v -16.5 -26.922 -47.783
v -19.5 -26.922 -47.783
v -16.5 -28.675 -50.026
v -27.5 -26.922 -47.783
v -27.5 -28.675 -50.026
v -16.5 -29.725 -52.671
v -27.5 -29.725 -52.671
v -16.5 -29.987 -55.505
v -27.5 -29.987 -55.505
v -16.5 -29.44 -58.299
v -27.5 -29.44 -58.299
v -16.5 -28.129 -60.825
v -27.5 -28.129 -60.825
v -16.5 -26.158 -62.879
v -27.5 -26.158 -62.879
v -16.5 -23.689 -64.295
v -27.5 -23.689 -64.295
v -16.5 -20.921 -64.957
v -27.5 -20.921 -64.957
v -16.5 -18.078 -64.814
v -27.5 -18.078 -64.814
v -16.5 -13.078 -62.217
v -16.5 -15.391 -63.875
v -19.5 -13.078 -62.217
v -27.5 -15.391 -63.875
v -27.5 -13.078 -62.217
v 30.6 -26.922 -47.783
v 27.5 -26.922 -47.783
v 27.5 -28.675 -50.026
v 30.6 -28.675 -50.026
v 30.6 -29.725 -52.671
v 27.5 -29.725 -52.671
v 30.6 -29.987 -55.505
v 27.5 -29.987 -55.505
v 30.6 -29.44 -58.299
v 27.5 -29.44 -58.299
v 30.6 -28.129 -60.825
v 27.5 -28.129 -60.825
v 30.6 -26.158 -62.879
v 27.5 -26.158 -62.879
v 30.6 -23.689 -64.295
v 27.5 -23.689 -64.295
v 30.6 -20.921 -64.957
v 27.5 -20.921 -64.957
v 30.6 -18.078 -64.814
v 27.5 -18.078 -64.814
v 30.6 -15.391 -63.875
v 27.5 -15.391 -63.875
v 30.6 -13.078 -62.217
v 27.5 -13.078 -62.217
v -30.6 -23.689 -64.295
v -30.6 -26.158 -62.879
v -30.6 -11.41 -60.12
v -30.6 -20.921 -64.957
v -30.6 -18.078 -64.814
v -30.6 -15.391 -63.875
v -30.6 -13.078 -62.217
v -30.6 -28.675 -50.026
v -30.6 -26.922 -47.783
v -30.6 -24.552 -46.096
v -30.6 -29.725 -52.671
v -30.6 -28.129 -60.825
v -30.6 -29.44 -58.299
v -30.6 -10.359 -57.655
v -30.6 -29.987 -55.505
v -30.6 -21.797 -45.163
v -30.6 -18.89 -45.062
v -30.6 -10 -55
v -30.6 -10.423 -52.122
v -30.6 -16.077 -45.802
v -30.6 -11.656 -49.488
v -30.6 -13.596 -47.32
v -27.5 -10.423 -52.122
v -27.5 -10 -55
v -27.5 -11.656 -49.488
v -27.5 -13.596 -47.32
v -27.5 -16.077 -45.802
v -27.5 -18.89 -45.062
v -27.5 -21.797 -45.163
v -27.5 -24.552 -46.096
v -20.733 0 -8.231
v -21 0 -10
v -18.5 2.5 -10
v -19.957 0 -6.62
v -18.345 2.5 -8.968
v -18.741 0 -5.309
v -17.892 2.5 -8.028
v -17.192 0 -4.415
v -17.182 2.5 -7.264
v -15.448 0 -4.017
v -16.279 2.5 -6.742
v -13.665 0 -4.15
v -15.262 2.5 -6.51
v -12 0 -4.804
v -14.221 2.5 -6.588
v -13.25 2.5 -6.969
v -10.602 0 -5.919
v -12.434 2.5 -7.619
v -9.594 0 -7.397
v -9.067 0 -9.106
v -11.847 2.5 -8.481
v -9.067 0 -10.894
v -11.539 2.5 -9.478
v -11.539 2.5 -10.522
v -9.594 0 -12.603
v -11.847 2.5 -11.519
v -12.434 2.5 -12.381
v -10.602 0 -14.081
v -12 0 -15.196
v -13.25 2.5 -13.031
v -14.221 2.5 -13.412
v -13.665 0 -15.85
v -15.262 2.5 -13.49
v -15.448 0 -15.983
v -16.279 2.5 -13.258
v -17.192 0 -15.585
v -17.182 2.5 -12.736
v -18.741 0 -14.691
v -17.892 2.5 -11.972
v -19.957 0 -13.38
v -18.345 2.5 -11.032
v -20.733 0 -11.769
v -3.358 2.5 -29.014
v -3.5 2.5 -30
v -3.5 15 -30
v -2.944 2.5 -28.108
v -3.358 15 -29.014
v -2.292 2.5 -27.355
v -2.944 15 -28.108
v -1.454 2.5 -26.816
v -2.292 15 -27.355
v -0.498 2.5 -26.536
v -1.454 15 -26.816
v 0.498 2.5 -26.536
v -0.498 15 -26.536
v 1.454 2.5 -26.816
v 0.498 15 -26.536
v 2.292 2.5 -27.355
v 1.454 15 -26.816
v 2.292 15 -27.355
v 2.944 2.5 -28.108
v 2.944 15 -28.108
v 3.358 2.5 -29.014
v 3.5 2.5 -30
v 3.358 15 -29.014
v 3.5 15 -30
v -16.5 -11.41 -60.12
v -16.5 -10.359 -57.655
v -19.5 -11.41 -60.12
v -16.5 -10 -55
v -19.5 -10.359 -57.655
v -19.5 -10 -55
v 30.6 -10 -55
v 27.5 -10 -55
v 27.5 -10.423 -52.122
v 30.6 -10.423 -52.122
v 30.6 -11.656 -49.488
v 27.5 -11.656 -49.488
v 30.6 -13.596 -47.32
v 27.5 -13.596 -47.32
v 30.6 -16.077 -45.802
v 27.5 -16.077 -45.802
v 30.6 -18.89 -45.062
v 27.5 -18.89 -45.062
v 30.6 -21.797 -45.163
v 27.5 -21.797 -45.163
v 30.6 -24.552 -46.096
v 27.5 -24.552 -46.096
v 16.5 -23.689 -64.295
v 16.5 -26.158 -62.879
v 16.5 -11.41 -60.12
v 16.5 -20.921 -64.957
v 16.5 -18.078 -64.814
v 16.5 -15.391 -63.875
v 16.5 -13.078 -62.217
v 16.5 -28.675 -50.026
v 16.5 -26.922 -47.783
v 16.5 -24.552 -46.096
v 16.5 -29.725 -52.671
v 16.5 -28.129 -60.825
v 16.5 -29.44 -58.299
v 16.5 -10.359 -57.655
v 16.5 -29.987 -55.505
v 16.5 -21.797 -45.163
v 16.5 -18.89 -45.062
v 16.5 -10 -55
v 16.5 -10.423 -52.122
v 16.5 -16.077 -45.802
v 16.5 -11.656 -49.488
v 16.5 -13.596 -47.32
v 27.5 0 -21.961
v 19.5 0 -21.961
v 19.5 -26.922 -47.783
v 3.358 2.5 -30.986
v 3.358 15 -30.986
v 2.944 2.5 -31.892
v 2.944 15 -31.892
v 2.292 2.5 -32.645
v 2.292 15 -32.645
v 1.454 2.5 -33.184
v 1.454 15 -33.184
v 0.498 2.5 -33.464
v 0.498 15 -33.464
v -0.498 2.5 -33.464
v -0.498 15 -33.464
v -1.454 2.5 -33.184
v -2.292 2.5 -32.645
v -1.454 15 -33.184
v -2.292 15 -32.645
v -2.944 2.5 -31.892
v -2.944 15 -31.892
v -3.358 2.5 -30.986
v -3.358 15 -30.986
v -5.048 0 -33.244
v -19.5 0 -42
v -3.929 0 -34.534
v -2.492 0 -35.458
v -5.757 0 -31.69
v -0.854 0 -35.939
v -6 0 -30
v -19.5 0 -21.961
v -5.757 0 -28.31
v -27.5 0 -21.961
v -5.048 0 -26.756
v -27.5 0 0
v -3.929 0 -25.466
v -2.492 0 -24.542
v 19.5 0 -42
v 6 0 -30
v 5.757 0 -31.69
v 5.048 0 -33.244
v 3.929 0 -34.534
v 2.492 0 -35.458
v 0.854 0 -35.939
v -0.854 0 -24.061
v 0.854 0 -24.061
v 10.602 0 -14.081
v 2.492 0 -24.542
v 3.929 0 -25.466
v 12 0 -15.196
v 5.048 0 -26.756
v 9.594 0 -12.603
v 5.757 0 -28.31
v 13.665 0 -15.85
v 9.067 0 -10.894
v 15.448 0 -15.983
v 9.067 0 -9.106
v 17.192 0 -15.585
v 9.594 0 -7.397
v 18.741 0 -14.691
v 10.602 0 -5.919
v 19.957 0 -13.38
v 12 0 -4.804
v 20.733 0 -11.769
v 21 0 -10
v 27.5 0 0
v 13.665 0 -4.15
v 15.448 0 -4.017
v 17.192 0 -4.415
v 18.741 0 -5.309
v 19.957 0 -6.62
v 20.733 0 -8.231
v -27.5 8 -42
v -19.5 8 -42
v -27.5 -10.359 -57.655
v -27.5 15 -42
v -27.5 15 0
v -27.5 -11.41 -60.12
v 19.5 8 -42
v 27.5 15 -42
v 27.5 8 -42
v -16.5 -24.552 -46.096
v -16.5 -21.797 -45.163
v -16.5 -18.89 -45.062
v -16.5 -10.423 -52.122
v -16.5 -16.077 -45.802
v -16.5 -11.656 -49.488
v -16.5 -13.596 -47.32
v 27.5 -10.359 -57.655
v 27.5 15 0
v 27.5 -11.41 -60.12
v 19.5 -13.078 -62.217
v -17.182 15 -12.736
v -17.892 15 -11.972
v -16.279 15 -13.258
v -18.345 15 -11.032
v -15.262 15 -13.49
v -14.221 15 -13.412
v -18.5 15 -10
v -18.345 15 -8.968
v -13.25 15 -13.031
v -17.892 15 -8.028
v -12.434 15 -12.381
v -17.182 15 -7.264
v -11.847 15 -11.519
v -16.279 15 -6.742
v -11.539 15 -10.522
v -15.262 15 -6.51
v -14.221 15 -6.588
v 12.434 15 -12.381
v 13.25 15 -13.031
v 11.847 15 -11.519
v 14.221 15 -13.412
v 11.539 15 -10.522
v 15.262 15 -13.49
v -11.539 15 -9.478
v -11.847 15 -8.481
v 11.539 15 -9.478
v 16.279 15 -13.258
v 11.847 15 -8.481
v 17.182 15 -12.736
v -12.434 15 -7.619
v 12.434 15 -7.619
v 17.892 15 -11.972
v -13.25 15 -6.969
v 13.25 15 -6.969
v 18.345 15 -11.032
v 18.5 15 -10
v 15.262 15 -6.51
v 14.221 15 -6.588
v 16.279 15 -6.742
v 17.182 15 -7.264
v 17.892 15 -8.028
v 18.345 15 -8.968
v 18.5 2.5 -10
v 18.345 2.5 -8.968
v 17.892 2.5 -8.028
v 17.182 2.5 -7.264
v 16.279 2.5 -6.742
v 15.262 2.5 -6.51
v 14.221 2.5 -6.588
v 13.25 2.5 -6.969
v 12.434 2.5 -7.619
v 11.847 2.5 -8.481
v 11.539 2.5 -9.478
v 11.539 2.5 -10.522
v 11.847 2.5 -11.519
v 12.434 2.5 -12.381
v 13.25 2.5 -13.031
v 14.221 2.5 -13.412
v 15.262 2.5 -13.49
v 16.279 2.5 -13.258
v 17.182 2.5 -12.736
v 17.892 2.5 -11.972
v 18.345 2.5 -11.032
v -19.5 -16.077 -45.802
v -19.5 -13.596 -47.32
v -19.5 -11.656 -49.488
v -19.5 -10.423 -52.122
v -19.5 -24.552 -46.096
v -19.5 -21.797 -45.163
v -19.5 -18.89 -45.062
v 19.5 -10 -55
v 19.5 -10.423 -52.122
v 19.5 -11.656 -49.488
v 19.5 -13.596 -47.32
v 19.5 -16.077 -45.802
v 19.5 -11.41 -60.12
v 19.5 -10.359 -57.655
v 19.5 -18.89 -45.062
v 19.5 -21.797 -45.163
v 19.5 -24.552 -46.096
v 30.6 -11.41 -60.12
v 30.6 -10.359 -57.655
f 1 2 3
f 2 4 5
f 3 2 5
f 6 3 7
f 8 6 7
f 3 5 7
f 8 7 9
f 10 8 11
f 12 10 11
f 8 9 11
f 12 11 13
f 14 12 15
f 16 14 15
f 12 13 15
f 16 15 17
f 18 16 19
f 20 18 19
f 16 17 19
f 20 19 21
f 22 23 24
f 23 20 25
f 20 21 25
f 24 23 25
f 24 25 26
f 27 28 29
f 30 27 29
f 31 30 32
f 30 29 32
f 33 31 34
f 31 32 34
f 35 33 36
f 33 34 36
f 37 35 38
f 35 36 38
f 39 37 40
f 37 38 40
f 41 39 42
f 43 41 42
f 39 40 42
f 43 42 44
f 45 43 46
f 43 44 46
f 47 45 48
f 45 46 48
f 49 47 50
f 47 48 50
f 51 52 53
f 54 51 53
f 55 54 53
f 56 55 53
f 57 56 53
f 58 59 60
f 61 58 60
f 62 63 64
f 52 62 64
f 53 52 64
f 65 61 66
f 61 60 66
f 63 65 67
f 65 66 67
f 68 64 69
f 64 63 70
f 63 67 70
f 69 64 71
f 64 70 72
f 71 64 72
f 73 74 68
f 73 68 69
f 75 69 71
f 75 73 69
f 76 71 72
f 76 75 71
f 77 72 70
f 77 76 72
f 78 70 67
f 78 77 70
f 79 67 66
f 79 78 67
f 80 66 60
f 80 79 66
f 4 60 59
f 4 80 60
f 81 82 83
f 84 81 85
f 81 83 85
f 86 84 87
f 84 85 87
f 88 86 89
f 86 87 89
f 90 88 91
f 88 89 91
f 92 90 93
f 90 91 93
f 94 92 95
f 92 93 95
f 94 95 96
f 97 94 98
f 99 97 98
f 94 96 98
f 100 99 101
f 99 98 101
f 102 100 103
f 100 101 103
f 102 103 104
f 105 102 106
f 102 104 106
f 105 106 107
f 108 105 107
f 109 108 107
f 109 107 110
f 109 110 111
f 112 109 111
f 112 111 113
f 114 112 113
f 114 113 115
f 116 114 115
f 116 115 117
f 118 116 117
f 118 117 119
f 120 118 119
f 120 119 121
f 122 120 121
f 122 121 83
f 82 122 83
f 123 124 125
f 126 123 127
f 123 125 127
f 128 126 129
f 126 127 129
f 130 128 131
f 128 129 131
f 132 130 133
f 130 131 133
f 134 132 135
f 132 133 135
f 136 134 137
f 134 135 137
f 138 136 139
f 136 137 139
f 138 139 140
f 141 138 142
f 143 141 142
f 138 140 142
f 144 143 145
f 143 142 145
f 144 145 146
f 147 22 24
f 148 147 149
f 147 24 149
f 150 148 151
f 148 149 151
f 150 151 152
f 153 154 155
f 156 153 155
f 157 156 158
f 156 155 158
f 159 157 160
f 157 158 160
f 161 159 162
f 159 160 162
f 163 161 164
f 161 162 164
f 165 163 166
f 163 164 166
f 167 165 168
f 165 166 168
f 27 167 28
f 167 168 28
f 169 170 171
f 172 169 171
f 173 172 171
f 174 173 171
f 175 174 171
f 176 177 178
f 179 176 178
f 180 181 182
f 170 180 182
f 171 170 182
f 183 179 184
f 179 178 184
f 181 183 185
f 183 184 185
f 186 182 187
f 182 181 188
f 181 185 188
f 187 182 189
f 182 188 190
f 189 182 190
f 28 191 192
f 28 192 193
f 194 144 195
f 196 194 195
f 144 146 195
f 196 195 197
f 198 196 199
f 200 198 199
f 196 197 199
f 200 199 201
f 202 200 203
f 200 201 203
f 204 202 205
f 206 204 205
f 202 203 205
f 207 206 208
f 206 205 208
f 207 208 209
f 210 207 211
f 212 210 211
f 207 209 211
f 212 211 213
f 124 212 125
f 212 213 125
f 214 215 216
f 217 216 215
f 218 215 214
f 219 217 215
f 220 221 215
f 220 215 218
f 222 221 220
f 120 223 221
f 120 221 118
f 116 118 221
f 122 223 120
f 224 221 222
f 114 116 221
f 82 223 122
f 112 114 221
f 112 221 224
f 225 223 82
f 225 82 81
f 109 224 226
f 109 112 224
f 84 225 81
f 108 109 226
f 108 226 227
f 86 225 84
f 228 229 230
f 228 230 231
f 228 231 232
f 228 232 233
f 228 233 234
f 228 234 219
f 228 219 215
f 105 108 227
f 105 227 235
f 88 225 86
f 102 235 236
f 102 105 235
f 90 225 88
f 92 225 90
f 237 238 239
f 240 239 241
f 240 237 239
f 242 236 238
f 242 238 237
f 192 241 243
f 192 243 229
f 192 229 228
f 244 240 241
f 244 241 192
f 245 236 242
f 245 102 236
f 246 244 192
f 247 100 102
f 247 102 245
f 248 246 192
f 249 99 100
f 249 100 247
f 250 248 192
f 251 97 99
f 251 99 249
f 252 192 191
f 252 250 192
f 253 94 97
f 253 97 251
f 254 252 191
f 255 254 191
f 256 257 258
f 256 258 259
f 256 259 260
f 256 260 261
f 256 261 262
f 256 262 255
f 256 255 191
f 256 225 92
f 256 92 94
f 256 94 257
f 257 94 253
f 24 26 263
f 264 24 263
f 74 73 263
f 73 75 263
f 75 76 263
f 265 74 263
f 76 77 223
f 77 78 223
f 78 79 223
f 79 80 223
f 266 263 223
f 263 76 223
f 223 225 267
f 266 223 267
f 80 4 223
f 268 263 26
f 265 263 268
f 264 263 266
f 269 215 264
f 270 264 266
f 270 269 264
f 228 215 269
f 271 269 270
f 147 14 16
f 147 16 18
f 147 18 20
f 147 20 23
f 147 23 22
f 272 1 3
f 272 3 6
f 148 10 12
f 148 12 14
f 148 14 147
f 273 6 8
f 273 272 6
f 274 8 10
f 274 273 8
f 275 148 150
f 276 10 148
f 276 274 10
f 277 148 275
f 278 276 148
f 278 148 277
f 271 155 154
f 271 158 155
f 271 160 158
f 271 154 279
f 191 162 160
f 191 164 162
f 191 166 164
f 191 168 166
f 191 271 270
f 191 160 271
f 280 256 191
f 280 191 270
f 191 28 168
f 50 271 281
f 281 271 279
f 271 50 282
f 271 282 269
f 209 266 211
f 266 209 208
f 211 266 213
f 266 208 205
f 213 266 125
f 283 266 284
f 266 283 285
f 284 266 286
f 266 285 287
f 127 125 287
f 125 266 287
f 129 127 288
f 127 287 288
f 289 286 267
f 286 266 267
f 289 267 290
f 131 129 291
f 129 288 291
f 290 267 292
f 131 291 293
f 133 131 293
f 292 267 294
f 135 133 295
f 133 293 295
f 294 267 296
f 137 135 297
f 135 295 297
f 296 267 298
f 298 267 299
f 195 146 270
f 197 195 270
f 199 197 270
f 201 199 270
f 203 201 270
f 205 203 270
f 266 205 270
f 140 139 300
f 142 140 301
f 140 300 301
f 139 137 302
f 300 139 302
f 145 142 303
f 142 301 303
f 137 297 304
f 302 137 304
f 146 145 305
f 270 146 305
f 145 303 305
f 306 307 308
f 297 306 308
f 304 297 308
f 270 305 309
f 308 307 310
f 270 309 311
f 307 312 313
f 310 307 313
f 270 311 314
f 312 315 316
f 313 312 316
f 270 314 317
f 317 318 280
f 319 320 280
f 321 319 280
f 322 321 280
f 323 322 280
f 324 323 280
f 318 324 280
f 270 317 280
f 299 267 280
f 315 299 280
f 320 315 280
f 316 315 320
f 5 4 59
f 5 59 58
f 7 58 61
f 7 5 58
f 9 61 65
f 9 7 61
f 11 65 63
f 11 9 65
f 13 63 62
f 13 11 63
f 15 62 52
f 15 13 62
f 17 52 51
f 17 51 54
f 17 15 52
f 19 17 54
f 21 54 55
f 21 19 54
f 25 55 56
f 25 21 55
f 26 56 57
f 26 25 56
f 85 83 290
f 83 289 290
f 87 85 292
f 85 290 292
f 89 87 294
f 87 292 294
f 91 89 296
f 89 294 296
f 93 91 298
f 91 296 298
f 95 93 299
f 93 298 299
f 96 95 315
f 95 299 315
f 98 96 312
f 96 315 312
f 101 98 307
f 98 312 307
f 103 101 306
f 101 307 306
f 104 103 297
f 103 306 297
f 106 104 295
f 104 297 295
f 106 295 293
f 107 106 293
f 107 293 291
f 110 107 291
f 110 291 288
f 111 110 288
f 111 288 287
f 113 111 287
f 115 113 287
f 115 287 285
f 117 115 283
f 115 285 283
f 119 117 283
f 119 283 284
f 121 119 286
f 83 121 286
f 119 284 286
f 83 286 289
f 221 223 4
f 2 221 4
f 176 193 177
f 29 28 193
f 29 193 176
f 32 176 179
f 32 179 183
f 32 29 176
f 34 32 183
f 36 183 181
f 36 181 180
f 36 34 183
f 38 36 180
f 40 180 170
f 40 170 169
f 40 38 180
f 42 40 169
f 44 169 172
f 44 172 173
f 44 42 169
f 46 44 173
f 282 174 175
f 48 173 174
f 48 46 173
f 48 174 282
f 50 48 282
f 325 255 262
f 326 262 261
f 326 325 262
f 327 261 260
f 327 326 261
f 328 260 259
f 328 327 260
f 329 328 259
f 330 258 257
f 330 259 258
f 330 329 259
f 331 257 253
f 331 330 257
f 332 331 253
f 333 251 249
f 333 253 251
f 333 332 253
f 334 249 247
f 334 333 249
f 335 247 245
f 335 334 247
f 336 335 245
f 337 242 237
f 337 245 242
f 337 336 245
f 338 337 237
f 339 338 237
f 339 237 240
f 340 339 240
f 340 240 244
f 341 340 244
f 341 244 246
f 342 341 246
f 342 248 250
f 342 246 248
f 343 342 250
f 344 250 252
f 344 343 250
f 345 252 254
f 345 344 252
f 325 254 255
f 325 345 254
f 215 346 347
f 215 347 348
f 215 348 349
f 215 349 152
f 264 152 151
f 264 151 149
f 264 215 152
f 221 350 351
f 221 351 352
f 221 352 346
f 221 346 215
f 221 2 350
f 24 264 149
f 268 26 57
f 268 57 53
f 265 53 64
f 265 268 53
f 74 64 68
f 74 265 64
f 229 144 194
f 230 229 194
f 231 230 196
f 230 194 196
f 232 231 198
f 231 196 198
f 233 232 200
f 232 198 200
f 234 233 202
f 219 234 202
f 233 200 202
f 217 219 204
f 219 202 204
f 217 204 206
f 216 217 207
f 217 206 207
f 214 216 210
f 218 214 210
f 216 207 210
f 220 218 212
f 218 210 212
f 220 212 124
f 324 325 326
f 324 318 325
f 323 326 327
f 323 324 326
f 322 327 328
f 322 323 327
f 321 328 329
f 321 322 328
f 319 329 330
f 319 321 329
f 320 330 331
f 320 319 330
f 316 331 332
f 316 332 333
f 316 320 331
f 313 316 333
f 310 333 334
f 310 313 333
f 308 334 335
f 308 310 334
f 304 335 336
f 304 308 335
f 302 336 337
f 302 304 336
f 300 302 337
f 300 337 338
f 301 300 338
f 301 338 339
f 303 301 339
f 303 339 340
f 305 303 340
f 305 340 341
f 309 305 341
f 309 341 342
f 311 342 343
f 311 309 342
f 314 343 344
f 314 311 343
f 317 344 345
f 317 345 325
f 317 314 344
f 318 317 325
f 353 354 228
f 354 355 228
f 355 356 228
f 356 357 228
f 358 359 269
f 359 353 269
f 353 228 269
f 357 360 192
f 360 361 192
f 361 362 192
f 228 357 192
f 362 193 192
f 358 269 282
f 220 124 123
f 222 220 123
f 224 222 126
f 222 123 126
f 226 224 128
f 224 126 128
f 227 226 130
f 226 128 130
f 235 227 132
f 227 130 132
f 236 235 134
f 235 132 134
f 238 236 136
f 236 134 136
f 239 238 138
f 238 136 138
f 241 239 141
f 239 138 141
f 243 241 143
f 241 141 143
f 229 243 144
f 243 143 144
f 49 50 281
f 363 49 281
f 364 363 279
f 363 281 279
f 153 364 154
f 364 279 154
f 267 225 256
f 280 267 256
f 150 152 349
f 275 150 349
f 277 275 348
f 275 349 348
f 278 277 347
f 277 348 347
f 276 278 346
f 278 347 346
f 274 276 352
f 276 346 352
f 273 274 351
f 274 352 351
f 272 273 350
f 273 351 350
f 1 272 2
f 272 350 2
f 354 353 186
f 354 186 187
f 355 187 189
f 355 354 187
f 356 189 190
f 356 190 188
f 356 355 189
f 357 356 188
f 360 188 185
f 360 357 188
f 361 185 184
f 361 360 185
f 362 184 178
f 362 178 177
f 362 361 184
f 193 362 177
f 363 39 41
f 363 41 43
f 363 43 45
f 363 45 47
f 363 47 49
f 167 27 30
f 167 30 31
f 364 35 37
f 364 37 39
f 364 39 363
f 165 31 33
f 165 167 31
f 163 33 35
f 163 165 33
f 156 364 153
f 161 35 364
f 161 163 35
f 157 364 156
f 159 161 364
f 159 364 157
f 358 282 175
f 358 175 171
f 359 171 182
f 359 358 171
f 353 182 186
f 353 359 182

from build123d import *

# Parameters (mm, degrees)
F0_W           = 55
F0_H           = 42
F1_DEPTH       = 15
F3_DEPTH       = 8
F4_DEPTH       = 3.1
F4_DEPTH_BACK  = 11
F6_D           = 7
F6_CSINK_D     = 12
F6_CSINK_ANGLE = 90


# Not quite as in the source:
# - a pattern or mirror of a feature is missing from the dataset's text; its kind, count and spacing are read off the source's solid


with BuildPart() as f1:
    # F0 (on Front) → F1 (new body)
    with BuildSketch(Plane.XZ):
        with Locations((0, -21)):
            Rectangle(F0_W, F0_H)
    extrude(amount=-F1_DEPTH)

    # F2 (on face) → F3 (join)
    with BuildSketch(Plane.YZ.offset(27.5)):
        with BuildLine():
            Line((0, -42), (0, -21.960586854))
            Line((0, -21.960586854), (-26.9221419573, -47.7830788612))
            ThreePointArc((-26.9221419573, -47.7830788612), (-16.0770814164, -45.8015919972), (-10, -55))
            ThreePointArc((-10, -55), (-10.8015919972, -58.9229185836), (-13.0778580427, -62.2169211388))
            Line((-13.0778580427, -62.2169211388), (8, -42))
            Line((8, -42), (0, -42))
        make_face()
        with BuildLine():
            ThreePointArc((-10, -55), (-16.0770814164, -45.8015919972), (-26.9221419573, -47.7830788612))
            Line((-26.9221419573, -47.7830788612), (-13.0778580427, -62.2169211388))
            ThreePointArc((-13.0778580427, -62.2169211388), (-10.8015919972, -58.9229185836), (-10, -55))
        make_face()
    f3 = extrude(amount=-F3_DEPTH)

    # F3_copies: F3 across plane
    add(f3.mirror(Plane(origin=(0, 0, 0), x_dir=(0, 0, -1), z_dir=(-1, 0, 0))))

    # F2 (on face) → F4 (join, two sides)
    with BuildSketch(Plane.YZ.offset(27.5)) as f4_sk:
        with BuildLine():
            Line((-13.0778580427, -62.2169211388), (-26.9221419573, -47.7830788612))
            ThreePointArc((-26.9221419573, -47.7830788612), (-27.2169211388, -61.9221419573), (-13.0778580427, -62.2169211388))
        make_face()
        with BuildLine():
            ThreePointArc((-10, -55), (-16.0770814164, -45.8015919972), (-26.9221419573, -47.7830788612))
            Line((-26.9221419573, -47.7830788612), (-13.0778580427, -62.2169211388))
            ThreePointArc((-13.0778580427, -62.2169211388), (-10.8015919972, -58.9229185836), (-10, -55))
        make_face()
    f4 = extrude(amount=F4_DEPTH) + extrude(f4_sk.sketch, amount=-F4_DEPTH_BACK)

    # F4_copies: F4 across plane
    add(f4.mirror(Plane(origin=(0, 0, 0), x_dir=(0, 0, -1), z_dir=(-1, 0, 0))))

    # F6 (through all)
    with Locations(Plane.XZ):
        with Locations((-15, -10), (0, -30)):
            f6 = CounterSinkHole(F6_D / 2, F6_CSINK_D / 2, counter_sink_angle=F6_CSINK_ANGLE)

    # F6_copies: F6 across plane
    add(f6.mirror(Plane(origin=(0, 0, 0), x_dir=(0, 0, 1), z_dir=(1, 0, 0))), mode=Mode.SUBTRACT)


solid = f1.part
